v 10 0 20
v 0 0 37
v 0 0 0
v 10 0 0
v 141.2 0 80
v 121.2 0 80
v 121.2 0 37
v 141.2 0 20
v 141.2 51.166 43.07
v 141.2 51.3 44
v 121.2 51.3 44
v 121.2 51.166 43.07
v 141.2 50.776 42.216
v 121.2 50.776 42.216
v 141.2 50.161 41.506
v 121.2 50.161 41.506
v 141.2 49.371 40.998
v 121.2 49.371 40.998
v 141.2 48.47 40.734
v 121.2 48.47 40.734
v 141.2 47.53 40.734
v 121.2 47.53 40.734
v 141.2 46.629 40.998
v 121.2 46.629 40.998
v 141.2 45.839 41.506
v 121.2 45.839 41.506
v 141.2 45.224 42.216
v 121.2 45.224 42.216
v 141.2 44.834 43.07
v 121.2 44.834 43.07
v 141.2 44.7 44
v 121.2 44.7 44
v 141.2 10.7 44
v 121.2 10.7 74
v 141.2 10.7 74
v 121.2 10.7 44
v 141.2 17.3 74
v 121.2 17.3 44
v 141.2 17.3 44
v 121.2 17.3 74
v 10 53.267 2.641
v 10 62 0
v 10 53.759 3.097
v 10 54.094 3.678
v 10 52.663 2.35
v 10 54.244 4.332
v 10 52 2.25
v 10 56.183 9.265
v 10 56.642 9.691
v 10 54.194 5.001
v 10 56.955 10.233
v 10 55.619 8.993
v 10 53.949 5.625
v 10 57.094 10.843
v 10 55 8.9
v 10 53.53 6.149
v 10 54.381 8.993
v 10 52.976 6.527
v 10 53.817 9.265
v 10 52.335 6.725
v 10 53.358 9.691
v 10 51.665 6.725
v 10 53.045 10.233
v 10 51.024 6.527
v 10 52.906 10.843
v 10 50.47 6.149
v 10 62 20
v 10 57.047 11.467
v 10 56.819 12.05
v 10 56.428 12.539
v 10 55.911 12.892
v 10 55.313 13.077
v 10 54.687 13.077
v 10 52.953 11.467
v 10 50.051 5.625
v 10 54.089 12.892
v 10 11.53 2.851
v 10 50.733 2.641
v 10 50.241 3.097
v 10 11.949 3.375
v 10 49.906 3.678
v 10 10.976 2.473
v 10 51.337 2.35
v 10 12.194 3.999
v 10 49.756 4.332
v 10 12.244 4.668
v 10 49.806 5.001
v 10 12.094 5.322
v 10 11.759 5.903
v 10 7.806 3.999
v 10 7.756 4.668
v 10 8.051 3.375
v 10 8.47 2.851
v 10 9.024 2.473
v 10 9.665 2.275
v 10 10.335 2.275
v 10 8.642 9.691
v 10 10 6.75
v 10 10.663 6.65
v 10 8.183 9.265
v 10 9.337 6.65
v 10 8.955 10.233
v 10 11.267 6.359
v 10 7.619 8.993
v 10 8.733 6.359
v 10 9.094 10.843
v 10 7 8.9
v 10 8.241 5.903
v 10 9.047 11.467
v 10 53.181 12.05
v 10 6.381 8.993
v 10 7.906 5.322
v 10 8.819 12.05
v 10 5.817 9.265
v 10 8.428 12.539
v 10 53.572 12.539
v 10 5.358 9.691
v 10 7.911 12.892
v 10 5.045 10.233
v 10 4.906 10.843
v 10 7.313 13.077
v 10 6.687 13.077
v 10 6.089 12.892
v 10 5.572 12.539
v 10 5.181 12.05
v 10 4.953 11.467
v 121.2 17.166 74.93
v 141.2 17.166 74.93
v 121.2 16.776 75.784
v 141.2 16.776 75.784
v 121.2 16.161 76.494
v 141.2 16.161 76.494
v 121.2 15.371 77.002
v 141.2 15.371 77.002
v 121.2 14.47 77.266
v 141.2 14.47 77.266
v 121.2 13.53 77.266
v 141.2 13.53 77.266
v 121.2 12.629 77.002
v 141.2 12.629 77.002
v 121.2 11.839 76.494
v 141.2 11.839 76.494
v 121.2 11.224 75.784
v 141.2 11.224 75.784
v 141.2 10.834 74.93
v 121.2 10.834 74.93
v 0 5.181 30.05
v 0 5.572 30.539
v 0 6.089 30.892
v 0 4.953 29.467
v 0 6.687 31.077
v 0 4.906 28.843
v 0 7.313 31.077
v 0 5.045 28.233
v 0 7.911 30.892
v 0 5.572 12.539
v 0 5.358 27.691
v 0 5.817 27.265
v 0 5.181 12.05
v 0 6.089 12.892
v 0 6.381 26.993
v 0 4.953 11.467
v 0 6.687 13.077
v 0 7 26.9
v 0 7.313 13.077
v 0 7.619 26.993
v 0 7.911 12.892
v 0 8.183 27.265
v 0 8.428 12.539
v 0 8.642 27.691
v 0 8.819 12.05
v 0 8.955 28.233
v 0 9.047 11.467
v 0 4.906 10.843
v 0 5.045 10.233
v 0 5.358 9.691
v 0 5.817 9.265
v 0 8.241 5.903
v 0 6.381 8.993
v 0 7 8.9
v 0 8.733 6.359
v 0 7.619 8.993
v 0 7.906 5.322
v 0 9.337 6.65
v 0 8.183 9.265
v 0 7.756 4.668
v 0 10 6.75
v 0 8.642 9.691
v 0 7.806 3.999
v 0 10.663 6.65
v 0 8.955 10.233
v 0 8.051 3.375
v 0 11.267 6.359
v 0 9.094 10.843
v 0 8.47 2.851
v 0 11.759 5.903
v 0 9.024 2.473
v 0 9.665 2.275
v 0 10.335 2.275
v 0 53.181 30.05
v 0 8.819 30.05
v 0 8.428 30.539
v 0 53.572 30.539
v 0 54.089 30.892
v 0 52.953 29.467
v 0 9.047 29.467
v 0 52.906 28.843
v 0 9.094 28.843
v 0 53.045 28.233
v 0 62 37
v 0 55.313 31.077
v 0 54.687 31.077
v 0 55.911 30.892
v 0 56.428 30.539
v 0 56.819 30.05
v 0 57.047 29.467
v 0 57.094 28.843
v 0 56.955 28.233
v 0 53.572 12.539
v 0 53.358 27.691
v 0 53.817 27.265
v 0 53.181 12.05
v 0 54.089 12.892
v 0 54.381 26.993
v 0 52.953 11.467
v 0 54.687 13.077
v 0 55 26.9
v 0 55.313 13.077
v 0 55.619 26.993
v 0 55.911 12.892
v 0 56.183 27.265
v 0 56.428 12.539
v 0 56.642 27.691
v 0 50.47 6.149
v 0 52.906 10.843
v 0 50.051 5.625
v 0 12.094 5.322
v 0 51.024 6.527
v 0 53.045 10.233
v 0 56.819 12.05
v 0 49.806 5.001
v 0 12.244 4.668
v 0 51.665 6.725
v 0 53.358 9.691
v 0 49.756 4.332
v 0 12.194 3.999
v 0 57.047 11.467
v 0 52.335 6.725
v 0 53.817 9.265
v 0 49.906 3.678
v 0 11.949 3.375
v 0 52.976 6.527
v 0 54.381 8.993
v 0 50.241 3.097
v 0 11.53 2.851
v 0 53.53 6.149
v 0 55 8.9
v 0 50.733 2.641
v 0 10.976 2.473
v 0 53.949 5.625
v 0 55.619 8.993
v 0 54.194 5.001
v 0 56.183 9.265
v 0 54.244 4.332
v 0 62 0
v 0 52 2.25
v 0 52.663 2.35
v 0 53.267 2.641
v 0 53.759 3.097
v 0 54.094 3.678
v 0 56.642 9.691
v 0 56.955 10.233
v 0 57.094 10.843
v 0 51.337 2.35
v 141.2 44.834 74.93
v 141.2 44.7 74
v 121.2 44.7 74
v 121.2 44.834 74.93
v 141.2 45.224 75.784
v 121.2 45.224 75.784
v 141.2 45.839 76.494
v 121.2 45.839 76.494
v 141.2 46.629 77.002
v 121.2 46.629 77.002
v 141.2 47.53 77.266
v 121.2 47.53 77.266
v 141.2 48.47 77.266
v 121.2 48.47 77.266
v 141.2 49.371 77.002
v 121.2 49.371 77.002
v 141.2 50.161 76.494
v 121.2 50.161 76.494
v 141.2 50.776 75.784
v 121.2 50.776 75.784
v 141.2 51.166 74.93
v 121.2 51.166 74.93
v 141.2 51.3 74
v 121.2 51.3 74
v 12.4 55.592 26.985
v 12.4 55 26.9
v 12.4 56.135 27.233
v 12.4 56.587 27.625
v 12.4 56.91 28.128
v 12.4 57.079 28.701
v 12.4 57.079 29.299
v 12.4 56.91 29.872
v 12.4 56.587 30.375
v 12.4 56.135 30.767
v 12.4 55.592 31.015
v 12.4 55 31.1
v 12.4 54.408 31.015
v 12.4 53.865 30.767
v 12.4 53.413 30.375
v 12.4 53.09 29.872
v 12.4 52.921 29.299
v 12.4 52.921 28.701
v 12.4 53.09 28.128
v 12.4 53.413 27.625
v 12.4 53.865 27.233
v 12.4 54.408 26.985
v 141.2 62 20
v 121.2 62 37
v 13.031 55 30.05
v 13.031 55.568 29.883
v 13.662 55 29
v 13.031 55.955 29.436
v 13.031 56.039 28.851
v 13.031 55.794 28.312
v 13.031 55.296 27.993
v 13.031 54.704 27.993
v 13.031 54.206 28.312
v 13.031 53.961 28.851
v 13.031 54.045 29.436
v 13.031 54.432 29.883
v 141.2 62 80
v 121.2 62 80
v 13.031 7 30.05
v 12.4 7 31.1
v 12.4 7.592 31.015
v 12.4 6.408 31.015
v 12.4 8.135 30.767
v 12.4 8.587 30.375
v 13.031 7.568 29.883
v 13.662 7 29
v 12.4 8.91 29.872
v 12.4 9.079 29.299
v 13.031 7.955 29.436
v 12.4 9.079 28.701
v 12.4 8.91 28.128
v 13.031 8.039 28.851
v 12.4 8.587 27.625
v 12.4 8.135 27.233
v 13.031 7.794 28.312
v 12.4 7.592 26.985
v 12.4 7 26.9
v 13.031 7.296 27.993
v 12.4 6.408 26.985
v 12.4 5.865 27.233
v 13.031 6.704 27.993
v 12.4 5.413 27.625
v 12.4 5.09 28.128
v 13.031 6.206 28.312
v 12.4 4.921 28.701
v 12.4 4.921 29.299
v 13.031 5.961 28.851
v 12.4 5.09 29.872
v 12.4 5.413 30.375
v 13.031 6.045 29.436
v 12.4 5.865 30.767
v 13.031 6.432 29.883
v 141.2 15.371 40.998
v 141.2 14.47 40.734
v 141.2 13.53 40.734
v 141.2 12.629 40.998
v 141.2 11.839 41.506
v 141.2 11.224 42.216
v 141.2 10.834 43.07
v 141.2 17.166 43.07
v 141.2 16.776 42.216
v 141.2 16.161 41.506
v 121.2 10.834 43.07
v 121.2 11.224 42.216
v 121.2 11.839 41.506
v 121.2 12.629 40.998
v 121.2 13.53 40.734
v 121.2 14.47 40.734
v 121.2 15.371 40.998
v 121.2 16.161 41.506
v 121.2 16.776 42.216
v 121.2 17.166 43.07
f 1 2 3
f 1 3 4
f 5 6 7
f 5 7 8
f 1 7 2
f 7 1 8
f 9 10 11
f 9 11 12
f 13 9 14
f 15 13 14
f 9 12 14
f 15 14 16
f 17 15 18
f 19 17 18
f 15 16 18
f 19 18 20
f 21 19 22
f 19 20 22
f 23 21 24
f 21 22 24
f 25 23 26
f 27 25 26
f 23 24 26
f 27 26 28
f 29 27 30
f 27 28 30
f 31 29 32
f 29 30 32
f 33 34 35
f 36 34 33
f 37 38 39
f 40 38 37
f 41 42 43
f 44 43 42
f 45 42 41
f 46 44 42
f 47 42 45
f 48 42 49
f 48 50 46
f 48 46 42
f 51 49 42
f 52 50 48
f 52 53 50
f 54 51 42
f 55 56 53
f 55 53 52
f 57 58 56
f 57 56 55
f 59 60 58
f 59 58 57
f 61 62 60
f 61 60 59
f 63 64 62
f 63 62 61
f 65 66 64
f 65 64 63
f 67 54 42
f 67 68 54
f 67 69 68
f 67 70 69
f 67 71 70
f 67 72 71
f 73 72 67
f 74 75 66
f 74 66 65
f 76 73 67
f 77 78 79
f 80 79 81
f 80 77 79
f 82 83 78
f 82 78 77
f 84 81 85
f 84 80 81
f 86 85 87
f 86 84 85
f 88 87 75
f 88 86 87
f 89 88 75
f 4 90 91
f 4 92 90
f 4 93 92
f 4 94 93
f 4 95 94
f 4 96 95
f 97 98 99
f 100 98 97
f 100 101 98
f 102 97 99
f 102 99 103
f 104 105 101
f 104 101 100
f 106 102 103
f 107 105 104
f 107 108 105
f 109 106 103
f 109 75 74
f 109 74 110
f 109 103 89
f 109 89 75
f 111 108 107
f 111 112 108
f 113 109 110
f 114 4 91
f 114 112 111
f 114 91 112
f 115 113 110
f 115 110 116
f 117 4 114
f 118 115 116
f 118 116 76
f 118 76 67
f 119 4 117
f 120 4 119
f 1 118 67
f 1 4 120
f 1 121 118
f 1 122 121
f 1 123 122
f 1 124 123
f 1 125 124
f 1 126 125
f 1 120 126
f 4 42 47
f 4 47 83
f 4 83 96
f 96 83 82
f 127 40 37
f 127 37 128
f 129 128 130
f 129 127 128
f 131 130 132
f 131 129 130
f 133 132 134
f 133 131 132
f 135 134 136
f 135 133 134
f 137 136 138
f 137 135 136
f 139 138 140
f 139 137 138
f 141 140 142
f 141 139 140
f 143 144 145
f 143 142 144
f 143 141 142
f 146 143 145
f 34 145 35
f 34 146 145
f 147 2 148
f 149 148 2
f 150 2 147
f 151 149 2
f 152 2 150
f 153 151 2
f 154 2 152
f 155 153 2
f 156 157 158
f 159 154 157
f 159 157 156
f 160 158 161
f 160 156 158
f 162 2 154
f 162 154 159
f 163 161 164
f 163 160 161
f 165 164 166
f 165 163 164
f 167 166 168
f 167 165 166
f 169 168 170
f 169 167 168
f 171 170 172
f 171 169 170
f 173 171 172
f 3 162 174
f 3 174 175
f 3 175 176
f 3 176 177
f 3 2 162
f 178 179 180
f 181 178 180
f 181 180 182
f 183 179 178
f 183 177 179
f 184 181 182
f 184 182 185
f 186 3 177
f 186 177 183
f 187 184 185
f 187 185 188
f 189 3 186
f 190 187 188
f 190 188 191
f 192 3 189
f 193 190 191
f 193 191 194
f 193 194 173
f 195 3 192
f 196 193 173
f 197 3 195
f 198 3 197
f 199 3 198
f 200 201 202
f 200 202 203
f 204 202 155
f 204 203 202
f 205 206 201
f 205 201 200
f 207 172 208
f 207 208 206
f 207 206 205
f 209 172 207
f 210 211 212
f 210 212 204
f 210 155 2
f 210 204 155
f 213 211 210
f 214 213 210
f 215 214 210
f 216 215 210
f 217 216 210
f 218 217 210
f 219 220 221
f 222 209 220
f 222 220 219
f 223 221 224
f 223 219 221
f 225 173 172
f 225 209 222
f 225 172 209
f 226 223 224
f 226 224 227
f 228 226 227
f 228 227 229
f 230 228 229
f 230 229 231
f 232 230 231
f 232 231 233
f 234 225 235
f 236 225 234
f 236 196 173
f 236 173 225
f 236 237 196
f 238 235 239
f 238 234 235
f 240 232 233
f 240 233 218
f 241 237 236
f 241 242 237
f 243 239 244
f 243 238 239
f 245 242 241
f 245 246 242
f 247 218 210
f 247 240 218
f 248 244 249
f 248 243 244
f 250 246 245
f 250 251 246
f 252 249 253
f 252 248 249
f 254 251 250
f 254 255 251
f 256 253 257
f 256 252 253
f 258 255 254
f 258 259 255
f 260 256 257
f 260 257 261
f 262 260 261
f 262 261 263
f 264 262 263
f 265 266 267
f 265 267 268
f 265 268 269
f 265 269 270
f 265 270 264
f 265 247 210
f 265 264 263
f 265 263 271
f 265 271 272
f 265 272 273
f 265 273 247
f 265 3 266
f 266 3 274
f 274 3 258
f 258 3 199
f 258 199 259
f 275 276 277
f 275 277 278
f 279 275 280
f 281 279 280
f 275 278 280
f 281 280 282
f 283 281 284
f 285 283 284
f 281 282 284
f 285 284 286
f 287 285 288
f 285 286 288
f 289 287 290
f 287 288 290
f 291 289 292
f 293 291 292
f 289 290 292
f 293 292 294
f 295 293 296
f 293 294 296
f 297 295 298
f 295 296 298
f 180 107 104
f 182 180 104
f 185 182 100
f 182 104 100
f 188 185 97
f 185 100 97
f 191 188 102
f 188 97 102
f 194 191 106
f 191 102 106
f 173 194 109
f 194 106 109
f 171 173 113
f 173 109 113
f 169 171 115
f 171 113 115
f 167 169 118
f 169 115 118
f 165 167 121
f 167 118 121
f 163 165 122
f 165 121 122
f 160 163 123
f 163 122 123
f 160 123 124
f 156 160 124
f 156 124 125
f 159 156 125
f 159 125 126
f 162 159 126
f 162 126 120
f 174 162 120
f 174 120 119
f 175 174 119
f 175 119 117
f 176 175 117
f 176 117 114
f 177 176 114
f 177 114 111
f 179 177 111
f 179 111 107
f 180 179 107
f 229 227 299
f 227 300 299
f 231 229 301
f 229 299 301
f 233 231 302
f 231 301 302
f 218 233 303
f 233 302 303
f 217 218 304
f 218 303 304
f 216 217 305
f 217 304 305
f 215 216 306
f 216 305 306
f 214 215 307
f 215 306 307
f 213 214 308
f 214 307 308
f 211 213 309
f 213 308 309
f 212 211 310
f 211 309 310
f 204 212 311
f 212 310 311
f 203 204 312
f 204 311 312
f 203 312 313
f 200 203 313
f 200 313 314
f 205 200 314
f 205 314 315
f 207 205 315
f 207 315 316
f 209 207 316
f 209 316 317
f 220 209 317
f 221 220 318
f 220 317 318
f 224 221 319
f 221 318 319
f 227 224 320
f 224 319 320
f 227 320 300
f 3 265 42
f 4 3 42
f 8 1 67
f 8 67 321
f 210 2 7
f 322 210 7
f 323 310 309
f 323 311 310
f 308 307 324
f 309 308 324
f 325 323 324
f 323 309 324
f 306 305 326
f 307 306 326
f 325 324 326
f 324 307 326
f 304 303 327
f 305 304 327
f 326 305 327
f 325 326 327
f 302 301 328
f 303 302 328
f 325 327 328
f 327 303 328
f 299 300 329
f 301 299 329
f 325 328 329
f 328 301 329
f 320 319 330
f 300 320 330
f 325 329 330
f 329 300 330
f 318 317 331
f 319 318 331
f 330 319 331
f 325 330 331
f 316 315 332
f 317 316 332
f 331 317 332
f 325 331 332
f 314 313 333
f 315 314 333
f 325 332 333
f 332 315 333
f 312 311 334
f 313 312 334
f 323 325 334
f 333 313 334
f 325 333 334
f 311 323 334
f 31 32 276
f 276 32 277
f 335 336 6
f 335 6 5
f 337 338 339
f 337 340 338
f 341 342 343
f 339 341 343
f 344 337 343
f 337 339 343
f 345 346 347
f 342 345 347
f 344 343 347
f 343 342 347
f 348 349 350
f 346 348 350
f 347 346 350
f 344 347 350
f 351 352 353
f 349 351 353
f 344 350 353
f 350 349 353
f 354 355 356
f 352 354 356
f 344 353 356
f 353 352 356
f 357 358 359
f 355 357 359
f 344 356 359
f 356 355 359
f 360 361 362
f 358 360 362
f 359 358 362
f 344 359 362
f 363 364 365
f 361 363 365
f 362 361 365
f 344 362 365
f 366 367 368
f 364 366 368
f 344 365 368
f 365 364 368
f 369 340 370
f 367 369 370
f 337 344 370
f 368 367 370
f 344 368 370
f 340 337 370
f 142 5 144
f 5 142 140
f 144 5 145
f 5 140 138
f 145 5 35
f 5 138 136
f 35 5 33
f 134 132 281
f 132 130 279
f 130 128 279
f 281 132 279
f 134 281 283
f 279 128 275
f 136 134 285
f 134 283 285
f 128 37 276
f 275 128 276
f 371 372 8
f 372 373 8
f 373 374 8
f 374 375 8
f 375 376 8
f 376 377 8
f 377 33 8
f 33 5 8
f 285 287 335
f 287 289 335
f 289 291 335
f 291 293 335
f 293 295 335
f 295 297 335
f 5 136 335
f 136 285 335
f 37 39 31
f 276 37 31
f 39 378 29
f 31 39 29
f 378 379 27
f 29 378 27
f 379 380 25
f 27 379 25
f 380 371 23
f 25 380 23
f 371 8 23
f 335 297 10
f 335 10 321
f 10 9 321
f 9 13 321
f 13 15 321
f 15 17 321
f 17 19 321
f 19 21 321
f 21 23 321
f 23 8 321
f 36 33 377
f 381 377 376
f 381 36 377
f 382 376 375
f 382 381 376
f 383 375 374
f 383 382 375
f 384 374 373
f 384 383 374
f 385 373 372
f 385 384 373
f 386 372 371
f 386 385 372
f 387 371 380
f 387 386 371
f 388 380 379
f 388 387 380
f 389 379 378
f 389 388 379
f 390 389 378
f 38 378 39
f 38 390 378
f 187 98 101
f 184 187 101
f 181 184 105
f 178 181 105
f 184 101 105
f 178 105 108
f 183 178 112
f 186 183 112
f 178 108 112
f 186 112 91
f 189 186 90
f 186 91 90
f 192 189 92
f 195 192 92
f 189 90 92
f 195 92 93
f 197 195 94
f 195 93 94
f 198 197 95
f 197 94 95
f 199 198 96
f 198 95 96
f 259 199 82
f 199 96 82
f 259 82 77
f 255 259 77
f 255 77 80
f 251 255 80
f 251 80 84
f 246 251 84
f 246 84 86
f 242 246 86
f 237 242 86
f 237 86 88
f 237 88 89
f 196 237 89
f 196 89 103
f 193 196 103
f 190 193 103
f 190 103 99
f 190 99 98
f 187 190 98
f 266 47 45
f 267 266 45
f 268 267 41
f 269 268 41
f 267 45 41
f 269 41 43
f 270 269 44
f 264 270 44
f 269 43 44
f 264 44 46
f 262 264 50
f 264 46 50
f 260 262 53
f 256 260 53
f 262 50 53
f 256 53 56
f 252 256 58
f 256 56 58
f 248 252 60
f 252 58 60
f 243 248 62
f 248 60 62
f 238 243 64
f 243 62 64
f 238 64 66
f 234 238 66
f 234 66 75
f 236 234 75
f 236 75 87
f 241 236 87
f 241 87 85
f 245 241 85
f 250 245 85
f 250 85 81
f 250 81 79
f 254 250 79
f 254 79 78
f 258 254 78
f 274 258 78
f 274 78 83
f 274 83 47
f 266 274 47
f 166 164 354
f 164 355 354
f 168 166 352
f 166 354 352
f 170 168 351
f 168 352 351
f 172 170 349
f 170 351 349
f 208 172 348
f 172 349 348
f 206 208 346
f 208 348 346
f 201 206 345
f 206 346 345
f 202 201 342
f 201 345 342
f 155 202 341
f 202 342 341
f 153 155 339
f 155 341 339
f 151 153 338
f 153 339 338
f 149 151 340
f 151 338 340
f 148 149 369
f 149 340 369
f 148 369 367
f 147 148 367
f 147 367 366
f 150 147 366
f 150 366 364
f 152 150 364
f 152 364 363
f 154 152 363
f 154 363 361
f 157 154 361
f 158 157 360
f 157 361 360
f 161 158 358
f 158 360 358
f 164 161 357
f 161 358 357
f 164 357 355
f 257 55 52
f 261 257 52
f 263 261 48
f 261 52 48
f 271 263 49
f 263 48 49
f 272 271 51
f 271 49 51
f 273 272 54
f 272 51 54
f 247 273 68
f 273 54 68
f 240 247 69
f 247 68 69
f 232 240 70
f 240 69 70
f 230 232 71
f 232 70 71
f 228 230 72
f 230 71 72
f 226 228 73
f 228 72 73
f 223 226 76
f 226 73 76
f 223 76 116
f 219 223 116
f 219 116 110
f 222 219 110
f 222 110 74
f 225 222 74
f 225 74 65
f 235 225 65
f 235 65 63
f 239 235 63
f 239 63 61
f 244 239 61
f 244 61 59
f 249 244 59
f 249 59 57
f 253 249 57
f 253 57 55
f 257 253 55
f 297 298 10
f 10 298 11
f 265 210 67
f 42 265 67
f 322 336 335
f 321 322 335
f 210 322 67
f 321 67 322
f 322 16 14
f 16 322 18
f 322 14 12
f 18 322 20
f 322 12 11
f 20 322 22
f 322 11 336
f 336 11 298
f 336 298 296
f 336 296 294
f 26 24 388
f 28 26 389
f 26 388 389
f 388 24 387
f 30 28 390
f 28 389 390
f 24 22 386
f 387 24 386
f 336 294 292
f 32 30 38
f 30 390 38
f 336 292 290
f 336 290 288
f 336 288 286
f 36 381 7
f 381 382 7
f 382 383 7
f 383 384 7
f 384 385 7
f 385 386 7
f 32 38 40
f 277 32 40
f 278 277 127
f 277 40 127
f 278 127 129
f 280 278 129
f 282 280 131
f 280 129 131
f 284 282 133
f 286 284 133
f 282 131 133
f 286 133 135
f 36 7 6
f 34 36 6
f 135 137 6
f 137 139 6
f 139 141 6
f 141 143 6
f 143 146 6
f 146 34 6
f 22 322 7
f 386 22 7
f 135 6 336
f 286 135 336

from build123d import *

# Parameters (mm, degrees)
SKETCH_1_W             = 141.2
SKETCH_1_H             = 62
EXTRUDE_1_DEPTH        = 80
SKETCH_2_W             = 131.2
SKETCH_2_H             = 20
SKETCH_2_W_2           = 121.2
SKETCH_2_H_2           = 43
CUT_EXTRUDE_1_DEPTH    = 174.728063363
CUT_EXTRUDE_2_DEPTH    = 70
SKETCH_4_R             = 2.25
CUT_EXTRUDE_3_DEPTH    = 166.702866602
HOLE_WIZARD_M5_1_D     = 4.2
HOLE_WIZARD_M5_1_DEPTH = 12.4
HOLE_WIZARD_M5_1_TIP   = 1.2618073


with BuildPart() as part:
    # 草图1 → 凸台-拉伸1 (new body)
    with BuildSketch(Plane.XY):
        with Locations((70.6, 31)):
            Rectangle(SKETCH_1_W, SKETCH_1_H)
    extrude(amount=EXTRUDE_1_DEPTH)

    # 草图2 → 切除-拉伸1 (cut, through all)
    with BuildSketch(Plane.XZ):
        with Locations((75.6, 10)):
            Rectangle(SKETCH_2_W, SKETCH_2_H)
        with Locations((60.6, 58.5)):
            Rectangle(SKETCH_2_W_2, SKETCH_2_H_2)
    extrude(amount=-CUT_EXTRUDE_1_DEPTH, mode=Mode.SUBTRACT)

    # 草图3 → 切除-拉伸2 (cut)
    with BuildSketch(Plane.ZY.offset(-121.2)):
        with BuildLine():
            Line((44, 17.3), (74, 17.3))
            ThreePointArc((74, 17.3), (77.3, 14), (74, 10.7))
            Line((74, 10.7), (44, 10.7))
            ThreePointArc((44, 10.7), (40.7, 14), (44, 17.3))
        make_face()
        with BuildLine():
            Line((44, 44.7), (74, 44.7))
            ThreePointArc((74, 44.7), (77.3, 48), (74, 51.3))
            Line((74, 51.3), (44, 51.3))
            ThreePointArc((44, 51.3), (40.7, 48), (44, 44.7))
        make_face()
    extrude(amount=-CUT_EXTRUDE_2_DEPTH, mode=Mode.SUBTRACT)

    # 草图4 → 切除-拉伸3 (cut, through all)
    with BuildSketch(Plane(origin=(10, 0, 0), x_dir=(0, 0, -1), z_dir=(1, 0, 0))):
        with Locations(Location((-4.5, 10, 0), (0, 0, 180))):
            Circle(SKETCH_4_R)
        with Locations((-4.5, 52)):
            Circle(SKETCH_4_R)
    extrude(amount=-CUT_EXTRUDE_3_DEPTH, mode=Mode.SUBTRACT)

    # M5 螺纹孔1
    with Locations(Plane.ZY):
        with Locations((29, 7), (11, 7), (11, 55), (29, 55)):
            Hole(HOLE_WIZARD_M5_1_D / 2, depth=HOLE_WIZARD_M5_1_DEPTH)
            with Locations((0, 0, -(HOLE_WIZARD_M5_1_DEPTH + HOLE_WIZARD_M5_1_TIP / 2))):  # 118° drill point
                Cone(0, HOLE_WIZARD_M5_1_D / 2, HOLE_WIZARD_M5_1_TIP, mode=Mode.SUBTRACT)


solid = part.part
